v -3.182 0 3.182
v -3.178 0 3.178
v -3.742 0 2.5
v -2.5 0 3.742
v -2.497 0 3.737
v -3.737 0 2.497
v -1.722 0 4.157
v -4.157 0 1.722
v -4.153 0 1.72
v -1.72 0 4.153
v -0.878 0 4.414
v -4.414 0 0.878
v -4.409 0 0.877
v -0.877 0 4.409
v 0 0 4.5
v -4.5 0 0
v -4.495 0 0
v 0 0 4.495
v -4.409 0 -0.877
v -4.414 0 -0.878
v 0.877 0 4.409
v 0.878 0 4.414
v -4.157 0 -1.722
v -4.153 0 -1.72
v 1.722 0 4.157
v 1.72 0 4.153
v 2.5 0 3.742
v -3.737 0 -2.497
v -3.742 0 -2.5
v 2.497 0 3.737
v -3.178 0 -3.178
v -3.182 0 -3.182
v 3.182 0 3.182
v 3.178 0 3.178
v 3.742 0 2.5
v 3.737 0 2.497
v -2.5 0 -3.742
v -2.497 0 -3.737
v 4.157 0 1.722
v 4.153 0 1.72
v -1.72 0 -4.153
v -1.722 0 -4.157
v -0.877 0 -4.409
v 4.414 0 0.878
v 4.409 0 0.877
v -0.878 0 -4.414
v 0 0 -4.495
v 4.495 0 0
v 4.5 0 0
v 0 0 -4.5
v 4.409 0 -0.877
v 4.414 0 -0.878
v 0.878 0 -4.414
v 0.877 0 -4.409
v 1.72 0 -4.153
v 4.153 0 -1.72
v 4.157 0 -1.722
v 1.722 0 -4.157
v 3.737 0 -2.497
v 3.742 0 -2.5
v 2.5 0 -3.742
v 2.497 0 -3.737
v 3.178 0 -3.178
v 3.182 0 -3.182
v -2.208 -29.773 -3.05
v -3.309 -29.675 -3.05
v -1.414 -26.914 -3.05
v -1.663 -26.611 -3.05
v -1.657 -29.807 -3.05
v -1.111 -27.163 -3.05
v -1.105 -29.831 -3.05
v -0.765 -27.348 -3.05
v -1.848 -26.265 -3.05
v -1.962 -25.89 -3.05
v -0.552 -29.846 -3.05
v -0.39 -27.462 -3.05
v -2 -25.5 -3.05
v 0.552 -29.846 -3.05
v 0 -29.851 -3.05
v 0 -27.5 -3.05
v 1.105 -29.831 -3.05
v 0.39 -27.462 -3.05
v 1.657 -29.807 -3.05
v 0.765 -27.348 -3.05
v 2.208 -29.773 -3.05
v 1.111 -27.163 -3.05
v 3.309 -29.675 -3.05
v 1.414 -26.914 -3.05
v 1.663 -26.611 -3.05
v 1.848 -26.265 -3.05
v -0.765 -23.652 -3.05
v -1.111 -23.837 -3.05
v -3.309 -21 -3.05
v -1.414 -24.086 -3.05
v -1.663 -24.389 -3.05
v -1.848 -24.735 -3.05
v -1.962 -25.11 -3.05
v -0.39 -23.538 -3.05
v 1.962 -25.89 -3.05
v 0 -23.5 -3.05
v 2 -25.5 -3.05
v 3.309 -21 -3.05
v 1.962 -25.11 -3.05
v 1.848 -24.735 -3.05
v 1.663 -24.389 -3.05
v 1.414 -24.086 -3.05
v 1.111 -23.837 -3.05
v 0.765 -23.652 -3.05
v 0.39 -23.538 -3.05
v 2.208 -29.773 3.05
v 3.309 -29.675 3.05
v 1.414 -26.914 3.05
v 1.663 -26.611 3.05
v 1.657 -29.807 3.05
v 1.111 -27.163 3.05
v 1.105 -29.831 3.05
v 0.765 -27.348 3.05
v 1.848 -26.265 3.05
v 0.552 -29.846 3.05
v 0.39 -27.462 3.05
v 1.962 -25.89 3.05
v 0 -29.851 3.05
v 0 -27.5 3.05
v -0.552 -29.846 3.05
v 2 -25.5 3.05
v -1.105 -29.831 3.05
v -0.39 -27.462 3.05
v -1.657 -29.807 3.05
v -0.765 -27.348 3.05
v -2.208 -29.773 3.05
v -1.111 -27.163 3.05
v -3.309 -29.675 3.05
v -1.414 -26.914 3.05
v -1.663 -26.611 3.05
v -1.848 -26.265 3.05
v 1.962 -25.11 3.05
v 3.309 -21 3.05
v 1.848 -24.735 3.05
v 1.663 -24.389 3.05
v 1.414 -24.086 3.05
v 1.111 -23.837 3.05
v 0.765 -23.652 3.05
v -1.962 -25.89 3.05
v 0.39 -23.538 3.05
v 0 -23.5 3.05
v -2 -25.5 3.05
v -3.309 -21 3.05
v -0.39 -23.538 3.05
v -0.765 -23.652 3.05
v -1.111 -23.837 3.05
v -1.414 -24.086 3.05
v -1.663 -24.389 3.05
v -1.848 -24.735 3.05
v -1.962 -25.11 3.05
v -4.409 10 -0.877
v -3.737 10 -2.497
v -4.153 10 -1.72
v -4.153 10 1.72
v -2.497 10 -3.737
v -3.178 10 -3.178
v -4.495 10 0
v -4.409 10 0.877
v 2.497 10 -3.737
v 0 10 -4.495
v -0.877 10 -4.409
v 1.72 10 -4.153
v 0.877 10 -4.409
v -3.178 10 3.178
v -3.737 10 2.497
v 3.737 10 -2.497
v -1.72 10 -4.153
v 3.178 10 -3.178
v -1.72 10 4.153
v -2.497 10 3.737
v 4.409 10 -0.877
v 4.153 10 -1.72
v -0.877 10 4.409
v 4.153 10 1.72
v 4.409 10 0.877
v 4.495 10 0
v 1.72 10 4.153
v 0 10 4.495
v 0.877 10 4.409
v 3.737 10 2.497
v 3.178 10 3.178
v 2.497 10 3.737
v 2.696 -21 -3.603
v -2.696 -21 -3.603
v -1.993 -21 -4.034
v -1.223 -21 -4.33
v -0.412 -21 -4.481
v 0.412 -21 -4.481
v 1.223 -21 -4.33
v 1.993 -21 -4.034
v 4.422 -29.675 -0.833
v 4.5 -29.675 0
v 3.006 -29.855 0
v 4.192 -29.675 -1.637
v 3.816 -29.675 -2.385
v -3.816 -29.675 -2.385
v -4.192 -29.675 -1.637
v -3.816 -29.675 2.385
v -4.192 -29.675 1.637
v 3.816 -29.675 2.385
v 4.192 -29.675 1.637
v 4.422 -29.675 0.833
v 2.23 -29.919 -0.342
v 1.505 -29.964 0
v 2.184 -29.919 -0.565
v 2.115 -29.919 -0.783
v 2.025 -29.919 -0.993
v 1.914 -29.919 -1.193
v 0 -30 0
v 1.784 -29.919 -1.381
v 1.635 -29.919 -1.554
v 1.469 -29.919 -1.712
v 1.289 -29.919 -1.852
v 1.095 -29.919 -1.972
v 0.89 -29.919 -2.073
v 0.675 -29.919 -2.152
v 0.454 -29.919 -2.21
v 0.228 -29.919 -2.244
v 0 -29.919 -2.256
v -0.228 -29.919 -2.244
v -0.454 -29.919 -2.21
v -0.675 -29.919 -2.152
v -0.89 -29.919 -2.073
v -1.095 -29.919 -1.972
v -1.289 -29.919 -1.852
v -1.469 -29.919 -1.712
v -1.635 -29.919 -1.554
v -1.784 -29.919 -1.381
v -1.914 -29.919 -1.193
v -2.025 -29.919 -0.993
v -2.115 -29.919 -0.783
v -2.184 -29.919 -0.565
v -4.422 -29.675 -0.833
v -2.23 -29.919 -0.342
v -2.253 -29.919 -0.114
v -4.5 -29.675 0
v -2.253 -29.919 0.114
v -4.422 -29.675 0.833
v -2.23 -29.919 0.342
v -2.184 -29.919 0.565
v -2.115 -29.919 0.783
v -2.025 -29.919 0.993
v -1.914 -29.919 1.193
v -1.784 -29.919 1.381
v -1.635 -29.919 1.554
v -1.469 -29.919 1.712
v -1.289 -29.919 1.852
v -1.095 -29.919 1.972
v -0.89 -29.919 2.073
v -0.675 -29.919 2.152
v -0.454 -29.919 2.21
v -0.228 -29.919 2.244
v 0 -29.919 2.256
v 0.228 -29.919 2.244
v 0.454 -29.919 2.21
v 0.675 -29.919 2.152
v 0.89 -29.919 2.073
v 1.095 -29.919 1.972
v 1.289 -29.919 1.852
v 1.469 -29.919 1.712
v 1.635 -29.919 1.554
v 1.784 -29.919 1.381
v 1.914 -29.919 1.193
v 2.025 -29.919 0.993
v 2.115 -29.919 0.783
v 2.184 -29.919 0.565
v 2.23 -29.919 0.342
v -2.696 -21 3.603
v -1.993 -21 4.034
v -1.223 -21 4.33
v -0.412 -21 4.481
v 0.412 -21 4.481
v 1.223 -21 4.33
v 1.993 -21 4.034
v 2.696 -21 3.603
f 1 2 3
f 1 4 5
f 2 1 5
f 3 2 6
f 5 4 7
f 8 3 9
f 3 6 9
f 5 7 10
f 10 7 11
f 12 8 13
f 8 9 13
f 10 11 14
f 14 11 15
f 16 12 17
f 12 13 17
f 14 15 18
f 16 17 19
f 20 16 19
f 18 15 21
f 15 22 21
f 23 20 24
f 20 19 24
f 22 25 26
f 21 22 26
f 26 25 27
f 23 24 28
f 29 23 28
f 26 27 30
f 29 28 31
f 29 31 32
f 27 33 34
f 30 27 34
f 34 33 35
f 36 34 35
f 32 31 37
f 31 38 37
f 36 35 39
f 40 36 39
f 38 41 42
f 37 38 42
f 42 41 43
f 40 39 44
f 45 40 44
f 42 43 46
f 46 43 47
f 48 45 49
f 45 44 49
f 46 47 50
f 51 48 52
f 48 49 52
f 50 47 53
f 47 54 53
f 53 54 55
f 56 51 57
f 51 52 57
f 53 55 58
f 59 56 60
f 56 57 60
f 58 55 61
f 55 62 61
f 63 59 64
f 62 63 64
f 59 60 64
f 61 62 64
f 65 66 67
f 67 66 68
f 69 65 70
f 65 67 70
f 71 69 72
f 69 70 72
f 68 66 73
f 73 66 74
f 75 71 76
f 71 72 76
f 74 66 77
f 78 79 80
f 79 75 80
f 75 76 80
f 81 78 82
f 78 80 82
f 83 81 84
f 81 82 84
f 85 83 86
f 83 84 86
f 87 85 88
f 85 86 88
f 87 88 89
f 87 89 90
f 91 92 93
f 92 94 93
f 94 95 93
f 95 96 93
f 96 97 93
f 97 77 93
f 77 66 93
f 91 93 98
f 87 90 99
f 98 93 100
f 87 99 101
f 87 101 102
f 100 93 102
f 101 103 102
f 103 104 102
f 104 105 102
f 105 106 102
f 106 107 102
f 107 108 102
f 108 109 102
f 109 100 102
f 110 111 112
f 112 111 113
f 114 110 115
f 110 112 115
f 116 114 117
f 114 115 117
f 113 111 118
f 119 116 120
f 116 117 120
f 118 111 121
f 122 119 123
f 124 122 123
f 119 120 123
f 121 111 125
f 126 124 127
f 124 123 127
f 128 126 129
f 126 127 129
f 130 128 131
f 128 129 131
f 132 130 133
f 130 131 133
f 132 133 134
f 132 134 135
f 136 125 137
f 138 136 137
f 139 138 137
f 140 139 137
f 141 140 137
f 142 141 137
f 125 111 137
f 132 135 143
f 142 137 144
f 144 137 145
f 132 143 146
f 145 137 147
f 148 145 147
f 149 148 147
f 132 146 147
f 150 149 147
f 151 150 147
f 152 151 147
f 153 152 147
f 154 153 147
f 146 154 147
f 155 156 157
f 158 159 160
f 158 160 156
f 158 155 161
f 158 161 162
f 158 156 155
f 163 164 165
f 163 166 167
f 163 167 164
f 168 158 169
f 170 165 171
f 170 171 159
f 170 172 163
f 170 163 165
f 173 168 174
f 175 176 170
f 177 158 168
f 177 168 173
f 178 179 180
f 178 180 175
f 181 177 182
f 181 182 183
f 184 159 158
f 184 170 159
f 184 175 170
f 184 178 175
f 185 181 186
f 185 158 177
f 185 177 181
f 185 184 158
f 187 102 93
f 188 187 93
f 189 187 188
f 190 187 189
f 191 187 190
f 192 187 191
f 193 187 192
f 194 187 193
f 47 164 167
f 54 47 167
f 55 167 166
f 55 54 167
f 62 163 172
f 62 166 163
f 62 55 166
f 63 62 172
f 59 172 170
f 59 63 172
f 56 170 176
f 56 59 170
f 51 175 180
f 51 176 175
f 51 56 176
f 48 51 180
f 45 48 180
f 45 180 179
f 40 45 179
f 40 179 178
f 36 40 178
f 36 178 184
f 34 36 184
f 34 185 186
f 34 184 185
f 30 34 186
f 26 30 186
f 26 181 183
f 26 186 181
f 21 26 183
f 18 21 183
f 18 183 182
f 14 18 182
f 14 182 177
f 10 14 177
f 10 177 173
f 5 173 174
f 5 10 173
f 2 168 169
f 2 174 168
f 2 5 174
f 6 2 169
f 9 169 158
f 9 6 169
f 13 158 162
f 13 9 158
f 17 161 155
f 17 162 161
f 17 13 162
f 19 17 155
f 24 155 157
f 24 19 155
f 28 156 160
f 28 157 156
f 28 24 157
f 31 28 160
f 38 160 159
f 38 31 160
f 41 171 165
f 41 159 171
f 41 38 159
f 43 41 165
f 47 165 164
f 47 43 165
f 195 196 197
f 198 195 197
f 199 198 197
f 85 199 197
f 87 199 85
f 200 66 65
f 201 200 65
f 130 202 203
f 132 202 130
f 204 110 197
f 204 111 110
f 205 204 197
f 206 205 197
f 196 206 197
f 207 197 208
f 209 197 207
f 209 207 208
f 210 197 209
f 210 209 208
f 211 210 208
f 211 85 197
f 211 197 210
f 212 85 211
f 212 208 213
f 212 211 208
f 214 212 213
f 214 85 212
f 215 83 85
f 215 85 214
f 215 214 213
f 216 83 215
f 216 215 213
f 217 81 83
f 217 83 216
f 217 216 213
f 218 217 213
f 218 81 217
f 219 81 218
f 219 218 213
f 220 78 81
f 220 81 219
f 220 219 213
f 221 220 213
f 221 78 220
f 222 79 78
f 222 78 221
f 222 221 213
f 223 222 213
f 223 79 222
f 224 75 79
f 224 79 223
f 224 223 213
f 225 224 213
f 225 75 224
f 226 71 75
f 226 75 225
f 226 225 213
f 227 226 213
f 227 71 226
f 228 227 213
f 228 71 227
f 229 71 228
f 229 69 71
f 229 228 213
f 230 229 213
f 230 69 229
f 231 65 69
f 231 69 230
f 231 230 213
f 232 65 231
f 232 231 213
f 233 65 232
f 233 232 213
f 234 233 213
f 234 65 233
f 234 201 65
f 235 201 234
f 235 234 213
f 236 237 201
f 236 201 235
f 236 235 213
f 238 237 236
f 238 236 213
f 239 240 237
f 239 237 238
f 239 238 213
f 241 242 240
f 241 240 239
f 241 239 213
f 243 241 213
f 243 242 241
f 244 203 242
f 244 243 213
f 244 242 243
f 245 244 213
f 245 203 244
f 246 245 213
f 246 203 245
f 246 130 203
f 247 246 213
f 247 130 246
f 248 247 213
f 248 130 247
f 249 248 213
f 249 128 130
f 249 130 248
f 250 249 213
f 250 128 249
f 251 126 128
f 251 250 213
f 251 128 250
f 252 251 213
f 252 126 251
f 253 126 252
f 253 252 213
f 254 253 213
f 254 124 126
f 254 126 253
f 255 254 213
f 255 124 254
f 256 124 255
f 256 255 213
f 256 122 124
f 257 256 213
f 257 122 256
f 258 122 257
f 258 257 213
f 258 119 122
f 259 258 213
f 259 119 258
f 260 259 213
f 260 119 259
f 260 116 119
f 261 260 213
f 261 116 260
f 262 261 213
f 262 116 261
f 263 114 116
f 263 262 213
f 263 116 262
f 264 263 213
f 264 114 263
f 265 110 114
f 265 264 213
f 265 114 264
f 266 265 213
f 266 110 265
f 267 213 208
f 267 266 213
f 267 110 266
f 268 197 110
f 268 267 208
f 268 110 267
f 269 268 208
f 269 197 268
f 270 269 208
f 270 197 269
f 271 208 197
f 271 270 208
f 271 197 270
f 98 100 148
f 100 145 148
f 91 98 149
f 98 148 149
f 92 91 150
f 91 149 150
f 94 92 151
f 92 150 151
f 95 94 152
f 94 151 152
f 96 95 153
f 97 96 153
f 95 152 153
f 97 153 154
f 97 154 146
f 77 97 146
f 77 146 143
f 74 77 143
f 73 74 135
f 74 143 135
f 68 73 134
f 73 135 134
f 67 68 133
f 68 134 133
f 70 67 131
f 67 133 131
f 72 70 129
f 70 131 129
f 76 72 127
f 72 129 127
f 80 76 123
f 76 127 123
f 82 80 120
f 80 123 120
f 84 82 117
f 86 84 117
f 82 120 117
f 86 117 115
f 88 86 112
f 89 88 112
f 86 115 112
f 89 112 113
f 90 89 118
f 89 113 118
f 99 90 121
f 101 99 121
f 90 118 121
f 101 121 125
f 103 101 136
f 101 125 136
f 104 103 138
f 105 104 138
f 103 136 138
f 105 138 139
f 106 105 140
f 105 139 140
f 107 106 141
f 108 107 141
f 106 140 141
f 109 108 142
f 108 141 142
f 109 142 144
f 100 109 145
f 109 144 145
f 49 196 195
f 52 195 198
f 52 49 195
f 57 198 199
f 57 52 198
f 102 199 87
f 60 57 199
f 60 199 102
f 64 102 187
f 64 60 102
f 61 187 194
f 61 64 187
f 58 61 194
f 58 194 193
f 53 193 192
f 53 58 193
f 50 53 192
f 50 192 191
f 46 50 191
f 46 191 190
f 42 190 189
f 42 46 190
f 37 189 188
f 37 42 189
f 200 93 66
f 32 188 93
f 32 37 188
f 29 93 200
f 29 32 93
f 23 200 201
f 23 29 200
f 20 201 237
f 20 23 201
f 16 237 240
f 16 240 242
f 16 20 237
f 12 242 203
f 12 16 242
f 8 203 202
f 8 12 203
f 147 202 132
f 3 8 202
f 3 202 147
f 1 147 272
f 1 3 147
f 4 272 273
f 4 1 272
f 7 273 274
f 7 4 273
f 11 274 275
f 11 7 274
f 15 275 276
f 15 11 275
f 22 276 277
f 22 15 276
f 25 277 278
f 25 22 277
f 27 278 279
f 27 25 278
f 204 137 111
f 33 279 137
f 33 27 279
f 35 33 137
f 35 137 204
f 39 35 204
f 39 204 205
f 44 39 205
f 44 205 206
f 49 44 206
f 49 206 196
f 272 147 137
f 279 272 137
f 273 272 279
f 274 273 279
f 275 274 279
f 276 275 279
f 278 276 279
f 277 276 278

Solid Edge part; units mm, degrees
sketch "Sketch1" plane through (0, 0, 0) normal (0, -1, 0) x (1, 0, 0)
  circle A0 centre (0, 0) radius 4.5
  dimension "D1" = 9
extrude "Protrusion1" add sketch "Sketch1" along normal blind 30
sketch "Sketch2" plane through (0, 0, 3.05) normal (0, 0, 1) x (1, 0, 0)
  line L0 (-8.9921, -33.4091) -> (-8.9921, -21)
  line L1 (-8.9921, -21) -> (16.3275, -21)
  line L2 (16.3275, -21) -> (16.3275, -33.9732)
  line L3 (16.3275, -33.9732) -> (-8.9921, -33.4091)
  dimension "D1" = 9
extrude "Extrusionsausschnitt_1" cut sketch "Sketch2" along normal blind 50.5
mirror "Mirror1" about plane through (0, 0, 0) normal (0, 0, 1) of "Extrusionsausschnitt_1"
sketch "Sketch3" plane through (0, -25.5, 3.05) normal (0, 0, 1) x (0, 1, 0)
  circle A0 centre (0, 0) radius 2
  dimension "D1" = 4.5
extrude "Extrusionsausschnitt_2" cut sketch "Sketch3" against normal blind 11.5
sketch "Sketch4" plane through (0, 0, 0) normal (0, 0, 1) x (1, 0, 0)
  line L0 (4.661, -29.6509) -> (5.9893, -29.6509)
  arc A0 (0, -30) -> (4.661, -29.6509) centre (0, 1.2934) ccw
revolve "RevolvedCutout1" cut sketch "Sketch4" angle 360 about axis through (0, -30, 0) along (0, -1, 0) material side at (5.3252, -29.7009, 0)
sketch "Sketch5" plane through (0, 0, 0) normal (0, 1, 0) x (0, 0, -1)
  circle A0 centre (0, 0) radius 4.495
extrude "Protrusion2" add sketch "Sketch5" along normal blind 10
